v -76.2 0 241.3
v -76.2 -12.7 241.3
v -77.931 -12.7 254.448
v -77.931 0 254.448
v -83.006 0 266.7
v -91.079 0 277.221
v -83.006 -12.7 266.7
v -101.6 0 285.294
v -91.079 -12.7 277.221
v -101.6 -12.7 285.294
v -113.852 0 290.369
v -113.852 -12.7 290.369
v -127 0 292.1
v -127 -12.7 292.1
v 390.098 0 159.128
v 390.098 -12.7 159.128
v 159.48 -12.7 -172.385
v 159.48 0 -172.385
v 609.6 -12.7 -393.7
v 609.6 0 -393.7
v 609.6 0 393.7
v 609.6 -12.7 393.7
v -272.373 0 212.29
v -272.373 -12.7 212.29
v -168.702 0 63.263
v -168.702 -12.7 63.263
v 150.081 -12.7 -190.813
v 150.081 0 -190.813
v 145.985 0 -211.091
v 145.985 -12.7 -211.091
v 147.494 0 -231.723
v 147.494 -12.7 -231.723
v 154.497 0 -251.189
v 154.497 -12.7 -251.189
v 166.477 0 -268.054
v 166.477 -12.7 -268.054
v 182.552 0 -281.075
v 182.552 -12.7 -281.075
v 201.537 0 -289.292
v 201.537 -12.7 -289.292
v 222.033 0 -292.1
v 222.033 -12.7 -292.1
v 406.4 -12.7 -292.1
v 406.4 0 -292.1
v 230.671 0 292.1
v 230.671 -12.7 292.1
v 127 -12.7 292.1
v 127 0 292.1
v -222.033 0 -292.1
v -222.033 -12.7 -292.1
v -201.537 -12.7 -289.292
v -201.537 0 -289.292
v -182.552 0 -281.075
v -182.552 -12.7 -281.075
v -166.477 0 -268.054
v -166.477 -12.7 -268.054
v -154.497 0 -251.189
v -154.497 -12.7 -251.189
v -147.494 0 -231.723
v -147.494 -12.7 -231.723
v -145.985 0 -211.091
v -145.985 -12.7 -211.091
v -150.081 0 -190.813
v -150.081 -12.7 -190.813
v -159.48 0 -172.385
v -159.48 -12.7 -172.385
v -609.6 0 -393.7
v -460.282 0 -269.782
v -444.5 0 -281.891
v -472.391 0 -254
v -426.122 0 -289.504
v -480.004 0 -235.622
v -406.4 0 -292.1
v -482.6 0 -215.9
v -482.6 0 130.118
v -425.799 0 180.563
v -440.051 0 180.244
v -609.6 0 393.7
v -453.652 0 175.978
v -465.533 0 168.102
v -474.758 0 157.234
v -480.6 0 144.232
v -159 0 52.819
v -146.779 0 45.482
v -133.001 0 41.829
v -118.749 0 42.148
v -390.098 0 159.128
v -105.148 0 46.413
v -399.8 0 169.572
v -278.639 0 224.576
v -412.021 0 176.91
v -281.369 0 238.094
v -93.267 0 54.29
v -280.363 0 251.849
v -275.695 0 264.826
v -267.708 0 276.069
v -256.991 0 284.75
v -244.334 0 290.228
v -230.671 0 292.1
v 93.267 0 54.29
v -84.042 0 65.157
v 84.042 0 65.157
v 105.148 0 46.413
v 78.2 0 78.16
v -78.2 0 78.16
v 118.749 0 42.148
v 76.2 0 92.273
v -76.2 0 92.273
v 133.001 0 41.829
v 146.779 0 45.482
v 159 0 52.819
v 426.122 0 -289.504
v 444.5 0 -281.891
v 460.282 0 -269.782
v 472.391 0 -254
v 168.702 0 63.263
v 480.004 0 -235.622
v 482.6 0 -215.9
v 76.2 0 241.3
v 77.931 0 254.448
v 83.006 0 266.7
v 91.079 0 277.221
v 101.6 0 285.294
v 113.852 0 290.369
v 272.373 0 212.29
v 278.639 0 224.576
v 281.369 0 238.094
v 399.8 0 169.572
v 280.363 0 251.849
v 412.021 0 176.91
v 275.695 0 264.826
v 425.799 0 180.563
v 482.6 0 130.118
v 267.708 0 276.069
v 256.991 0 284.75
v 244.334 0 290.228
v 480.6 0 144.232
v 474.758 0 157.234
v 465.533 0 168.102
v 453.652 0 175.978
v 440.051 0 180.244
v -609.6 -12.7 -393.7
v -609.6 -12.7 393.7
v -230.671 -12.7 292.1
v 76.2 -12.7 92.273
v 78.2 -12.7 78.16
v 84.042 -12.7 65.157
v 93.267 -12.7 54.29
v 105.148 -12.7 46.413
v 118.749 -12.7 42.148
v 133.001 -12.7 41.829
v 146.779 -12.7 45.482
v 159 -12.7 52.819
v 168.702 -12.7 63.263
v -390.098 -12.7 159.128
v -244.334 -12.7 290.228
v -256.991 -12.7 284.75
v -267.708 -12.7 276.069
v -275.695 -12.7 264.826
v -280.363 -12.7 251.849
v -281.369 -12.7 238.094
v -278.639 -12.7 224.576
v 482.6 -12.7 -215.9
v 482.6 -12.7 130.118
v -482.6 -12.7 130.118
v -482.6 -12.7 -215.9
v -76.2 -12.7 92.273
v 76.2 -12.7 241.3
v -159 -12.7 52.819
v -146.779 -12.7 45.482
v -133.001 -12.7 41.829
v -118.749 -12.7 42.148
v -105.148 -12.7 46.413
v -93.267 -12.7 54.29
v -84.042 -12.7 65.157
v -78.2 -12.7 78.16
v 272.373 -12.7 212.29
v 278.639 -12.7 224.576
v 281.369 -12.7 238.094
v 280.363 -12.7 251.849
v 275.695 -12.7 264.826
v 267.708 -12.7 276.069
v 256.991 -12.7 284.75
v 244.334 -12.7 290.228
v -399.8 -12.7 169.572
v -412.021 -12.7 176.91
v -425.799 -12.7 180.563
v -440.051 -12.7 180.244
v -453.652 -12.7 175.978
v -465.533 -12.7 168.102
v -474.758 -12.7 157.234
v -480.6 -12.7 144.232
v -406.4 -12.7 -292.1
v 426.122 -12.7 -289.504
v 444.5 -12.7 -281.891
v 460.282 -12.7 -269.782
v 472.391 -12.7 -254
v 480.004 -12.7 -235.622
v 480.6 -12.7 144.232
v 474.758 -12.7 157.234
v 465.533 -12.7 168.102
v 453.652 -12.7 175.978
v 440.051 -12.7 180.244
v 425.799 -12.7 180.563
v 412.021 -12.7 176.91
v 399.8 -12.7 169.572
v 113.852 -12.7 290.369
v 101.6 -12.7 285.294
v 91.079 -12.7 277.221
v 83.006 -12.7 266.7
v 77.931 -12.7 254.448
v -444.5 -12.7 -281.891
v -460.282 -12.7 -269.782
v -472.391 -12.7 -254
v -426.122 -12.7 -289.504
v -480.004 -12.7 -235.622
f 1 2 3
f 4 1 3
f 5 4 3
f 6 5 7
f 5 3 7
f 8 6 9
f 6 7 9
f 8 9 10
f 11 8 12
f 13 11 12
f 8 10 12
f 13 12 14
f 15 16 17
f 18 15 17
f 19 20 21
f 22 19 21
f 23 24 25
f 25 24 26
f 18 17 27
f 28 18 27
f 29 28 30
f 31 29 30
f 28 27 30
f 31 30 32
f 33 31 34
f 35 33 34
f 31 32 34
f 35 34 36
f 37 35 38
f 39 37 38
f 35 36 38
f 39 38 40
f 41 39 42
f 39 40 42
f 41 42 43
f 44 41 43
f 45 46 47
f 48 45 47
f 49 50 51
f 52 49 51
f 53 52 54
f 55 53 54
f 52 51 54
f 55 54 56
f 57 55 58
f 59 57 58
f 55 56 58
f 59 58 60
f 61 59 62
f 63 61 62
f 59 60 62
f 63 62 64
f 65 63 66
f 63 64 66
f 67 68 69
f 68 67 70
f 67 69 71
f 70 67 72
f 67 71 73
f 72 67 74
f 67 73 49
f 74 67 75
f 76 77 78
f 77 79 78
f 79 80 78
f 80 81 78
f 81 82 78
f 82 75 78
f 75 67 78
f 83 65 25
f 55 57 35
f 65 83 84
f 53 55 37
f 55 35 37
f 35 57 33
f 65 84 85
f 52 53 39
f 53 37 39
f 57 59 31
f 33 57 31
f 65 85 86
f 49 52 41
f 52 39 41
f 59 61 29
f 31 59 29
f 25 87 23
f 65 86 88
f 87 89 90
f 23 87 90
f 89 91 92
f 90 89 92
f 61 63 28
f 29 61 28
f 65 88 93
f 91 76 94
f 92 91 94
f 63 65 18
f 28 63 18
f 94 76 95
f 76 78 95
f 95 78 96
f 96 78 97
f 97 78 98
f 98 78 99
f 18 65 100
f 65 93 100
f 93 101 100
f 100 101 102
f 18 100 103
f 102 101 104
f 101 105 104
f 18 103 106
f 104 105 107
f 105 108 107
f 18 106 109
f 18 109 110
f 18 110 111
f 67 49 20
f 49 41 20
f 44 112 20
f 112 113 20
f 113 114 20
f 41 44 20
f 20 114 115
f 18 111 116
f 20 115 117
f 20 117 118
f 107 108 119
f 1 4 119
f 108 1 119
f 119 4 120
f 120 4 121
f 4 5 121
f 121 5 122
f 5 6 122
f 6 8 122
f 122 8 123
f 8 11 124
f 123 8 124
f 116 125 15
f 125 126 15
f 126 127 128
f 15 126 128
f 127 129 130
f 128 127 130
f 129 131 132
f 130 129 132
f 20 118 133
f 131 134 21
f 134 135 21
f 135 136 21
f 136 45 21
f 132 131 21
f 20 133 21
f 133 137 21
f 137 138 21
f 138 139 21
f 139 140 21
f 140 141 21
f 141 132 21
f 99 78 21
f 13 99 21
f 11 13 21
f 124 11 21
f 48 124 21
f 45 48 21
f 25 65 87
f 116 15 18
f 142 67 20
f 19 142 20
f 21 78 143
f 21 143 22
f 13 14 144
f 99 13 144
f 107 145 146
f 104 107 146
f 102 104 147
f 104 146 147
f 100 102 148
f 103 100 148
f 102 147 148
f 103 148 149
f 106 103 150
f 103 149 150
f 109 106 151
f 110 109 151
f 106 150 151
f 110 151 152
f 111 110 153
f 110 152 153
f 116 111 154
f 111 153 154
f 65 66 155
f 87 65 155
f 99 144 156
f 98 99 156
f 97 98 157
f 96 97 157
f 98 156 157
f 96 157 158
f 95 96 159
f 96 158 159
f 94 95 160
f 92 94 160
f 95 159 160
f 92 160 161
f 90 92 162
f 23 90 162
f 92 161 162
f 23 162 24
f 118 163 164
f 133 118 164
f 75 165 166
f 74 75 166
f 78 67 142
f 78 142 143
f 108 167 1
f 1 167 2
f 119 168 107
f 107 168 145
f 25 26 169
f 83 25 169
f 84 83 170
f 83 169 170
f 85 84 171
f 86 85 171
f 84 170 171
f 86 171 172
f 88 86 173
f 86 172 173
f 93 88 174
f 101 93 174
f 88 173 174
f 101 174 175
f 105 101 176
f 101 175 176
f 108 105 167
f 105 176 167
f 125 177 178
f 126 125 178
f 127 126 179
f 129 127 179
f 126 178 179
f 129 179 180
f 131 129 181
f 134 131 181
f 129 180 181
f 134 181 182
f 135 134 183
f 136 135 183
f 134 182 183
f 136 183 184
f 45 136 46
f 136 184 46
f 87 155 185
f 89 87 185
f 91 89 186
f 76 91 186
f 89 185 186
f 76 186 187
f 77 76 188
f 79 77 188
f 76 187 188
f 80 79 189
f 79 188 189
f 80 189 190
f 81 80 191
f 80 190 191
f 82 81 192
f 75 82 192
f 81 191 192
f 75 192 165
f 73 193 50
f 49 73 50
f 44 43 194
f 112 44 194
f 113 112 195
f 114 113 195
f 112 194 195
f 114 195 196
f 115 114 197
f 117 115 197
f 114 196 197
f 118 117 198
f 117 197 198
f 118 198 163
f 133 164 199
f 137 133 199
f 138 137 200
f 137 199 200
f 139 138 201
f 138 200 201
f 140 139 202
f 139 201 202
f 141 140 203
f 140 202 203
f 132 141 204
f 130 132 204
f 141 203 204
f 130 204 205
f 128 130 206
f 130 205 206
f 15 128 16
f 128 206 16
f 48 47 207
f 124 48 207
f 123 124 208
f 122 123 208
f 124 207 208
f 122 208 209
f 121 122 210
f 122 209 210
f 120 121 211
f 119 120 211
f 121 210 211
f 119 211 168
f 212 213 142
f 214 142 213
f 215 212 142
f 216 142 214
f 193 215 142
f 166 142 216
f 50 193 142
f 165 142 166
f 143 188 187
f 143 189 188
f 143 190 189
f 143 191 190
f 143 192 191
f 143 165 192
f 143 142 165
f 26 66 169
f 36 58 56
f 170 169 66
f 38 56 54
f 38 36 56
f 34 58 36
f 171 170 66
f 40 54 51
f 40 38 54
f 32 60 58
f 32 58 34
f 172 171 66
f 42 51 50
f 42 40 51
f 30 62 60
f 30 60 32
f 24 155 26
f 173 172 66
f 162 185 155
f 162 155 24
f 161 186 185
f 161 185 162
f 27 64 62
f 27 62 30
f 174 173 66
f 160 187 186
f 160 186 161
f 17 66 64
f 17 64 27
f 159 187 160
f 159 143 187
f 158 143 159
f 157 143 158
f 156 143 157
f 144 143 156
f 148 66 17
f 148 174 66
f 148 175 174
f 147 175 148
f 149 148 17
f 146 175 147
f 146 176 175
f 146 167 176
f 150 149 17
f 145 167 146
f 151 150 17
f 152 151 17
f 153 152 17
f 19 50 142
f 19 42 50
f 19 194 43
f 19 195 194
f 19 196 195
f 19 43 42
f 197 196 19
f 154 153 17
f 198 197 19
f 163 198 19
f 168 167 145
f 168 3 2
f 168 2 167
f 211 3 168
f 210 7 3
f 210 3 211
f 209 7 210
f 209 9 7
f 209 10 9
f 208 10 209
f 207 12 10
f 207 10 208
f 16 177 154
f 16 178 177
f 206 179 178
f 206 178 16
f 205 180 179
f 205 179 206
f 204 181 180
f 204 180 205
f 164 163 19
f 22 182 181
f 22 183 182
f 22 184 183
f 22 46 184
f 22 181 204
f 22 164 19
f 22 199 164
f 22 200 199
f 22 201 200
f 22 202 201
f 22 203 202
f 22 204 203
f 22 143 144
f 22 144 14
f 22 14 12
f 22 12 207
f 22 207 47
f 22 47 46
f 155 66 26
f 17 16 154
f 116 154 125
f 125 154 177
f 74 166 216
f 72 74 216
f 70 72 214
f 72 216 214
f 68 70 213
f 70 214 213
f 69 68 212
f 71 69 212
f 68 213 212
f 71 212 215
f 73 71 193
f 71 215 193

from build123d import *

# Parameters (mm, degrees)
F0_W     = 1219.2
F0_H     = 787.4
F1_DEPTH = 12.7
F3_DEPTH = 12.701


with BuildPart() as f1:
    # F0 (on Front) → F1 (new body)
    with BuildSketch(Plane.XZ):
        Rectangle(F0_W, F0_H)
    extrude(amount=F1_DEPTH)

    # F2 (on face) → F3 (cut, through all)
    with BuildSketch(Plane.XZ.offset(12.7)):
        with BuildLine():
            ThreePointArc((-390.098016, 159.128398), (-447.001631, 178.590483), (-482.6, 130.118322))
            Line((-482.6, 130.118322), (-482.6, -215.9))
            ThreePointArc((-482.6, -215.9), (-460.281537, -269.781537), (-406.4, -292.1))
            Line((-406.4, -292.1), (-222.033056, -292.1))
            ThreePointArc((-222.033056, -292.1), (-154.4968, -251.188726), (-159.480079, -172.384886))
            Line((-159.480079, -172.384886), (-390.098016, 159.128398))
        make_face()
        with BuildLine():
            ThreePointArc((-230.670696, 292.1), (-275.694867, 264.825817), (-272.37268, 212.289924))
            Line((-272.37268, 212.289924), (-168.701984, 63.263298))
            ThreePointArc((-168.701984, 63.263298), (-111.798369, 43.801213), (-76.2, 92.273374))
            Line((-76.2, 92.273374), (-76.2, 241.3))
            ThreePointArc((-76.2, 241.3), (-91.078976, 277.221024), (-127, 292.1))
            Line((-127, 292.1), (-230.670696, 292.1))
        make_face()
        with BuildLine():
            ThreePointArc((76.2, 92.273374), (111.798369, 43.801213), (168.701984, 63.263298))
            Line((168.701984, 63.263298), (272.37268, 212.289924))
            ThreePointArc((272.37268, 212.289924), (275.694867, 264.825817), (230.670696, 292.1))
            Line((230.670696, 292.1), (127, 292.1))
            ThreePointArc((127, 292.1), (91.078976, 277.221024), (76.2, 241.3))
            Line((76.2, 241.3), (76.2, 92.273374))
        make_face()
        with BuildLine():
            ThreePointArc((482.6, 130.118322), (447.001631, 178.590483), (390.098016, 159.128398))
            Line((390.098016, 159.128398), (159.480079, -172.384886))
            ThreePointArc((159.480079, -172.384886), (154.4968, -251.188726), (222.033056, -292.1))
            Line((222.033056, -292.1), (406.4, -292.1))
            ThreePointArc((406.4, -292.1), (460.281537, -269.781537), (482.6, -215.9))
            Line((482.6, -215.9), (482.6, 130.118322))
        make_face()
    extrude(amount=-F3_DEPTH, mode=Mode.SUBTRACT)


solid = f1.part
